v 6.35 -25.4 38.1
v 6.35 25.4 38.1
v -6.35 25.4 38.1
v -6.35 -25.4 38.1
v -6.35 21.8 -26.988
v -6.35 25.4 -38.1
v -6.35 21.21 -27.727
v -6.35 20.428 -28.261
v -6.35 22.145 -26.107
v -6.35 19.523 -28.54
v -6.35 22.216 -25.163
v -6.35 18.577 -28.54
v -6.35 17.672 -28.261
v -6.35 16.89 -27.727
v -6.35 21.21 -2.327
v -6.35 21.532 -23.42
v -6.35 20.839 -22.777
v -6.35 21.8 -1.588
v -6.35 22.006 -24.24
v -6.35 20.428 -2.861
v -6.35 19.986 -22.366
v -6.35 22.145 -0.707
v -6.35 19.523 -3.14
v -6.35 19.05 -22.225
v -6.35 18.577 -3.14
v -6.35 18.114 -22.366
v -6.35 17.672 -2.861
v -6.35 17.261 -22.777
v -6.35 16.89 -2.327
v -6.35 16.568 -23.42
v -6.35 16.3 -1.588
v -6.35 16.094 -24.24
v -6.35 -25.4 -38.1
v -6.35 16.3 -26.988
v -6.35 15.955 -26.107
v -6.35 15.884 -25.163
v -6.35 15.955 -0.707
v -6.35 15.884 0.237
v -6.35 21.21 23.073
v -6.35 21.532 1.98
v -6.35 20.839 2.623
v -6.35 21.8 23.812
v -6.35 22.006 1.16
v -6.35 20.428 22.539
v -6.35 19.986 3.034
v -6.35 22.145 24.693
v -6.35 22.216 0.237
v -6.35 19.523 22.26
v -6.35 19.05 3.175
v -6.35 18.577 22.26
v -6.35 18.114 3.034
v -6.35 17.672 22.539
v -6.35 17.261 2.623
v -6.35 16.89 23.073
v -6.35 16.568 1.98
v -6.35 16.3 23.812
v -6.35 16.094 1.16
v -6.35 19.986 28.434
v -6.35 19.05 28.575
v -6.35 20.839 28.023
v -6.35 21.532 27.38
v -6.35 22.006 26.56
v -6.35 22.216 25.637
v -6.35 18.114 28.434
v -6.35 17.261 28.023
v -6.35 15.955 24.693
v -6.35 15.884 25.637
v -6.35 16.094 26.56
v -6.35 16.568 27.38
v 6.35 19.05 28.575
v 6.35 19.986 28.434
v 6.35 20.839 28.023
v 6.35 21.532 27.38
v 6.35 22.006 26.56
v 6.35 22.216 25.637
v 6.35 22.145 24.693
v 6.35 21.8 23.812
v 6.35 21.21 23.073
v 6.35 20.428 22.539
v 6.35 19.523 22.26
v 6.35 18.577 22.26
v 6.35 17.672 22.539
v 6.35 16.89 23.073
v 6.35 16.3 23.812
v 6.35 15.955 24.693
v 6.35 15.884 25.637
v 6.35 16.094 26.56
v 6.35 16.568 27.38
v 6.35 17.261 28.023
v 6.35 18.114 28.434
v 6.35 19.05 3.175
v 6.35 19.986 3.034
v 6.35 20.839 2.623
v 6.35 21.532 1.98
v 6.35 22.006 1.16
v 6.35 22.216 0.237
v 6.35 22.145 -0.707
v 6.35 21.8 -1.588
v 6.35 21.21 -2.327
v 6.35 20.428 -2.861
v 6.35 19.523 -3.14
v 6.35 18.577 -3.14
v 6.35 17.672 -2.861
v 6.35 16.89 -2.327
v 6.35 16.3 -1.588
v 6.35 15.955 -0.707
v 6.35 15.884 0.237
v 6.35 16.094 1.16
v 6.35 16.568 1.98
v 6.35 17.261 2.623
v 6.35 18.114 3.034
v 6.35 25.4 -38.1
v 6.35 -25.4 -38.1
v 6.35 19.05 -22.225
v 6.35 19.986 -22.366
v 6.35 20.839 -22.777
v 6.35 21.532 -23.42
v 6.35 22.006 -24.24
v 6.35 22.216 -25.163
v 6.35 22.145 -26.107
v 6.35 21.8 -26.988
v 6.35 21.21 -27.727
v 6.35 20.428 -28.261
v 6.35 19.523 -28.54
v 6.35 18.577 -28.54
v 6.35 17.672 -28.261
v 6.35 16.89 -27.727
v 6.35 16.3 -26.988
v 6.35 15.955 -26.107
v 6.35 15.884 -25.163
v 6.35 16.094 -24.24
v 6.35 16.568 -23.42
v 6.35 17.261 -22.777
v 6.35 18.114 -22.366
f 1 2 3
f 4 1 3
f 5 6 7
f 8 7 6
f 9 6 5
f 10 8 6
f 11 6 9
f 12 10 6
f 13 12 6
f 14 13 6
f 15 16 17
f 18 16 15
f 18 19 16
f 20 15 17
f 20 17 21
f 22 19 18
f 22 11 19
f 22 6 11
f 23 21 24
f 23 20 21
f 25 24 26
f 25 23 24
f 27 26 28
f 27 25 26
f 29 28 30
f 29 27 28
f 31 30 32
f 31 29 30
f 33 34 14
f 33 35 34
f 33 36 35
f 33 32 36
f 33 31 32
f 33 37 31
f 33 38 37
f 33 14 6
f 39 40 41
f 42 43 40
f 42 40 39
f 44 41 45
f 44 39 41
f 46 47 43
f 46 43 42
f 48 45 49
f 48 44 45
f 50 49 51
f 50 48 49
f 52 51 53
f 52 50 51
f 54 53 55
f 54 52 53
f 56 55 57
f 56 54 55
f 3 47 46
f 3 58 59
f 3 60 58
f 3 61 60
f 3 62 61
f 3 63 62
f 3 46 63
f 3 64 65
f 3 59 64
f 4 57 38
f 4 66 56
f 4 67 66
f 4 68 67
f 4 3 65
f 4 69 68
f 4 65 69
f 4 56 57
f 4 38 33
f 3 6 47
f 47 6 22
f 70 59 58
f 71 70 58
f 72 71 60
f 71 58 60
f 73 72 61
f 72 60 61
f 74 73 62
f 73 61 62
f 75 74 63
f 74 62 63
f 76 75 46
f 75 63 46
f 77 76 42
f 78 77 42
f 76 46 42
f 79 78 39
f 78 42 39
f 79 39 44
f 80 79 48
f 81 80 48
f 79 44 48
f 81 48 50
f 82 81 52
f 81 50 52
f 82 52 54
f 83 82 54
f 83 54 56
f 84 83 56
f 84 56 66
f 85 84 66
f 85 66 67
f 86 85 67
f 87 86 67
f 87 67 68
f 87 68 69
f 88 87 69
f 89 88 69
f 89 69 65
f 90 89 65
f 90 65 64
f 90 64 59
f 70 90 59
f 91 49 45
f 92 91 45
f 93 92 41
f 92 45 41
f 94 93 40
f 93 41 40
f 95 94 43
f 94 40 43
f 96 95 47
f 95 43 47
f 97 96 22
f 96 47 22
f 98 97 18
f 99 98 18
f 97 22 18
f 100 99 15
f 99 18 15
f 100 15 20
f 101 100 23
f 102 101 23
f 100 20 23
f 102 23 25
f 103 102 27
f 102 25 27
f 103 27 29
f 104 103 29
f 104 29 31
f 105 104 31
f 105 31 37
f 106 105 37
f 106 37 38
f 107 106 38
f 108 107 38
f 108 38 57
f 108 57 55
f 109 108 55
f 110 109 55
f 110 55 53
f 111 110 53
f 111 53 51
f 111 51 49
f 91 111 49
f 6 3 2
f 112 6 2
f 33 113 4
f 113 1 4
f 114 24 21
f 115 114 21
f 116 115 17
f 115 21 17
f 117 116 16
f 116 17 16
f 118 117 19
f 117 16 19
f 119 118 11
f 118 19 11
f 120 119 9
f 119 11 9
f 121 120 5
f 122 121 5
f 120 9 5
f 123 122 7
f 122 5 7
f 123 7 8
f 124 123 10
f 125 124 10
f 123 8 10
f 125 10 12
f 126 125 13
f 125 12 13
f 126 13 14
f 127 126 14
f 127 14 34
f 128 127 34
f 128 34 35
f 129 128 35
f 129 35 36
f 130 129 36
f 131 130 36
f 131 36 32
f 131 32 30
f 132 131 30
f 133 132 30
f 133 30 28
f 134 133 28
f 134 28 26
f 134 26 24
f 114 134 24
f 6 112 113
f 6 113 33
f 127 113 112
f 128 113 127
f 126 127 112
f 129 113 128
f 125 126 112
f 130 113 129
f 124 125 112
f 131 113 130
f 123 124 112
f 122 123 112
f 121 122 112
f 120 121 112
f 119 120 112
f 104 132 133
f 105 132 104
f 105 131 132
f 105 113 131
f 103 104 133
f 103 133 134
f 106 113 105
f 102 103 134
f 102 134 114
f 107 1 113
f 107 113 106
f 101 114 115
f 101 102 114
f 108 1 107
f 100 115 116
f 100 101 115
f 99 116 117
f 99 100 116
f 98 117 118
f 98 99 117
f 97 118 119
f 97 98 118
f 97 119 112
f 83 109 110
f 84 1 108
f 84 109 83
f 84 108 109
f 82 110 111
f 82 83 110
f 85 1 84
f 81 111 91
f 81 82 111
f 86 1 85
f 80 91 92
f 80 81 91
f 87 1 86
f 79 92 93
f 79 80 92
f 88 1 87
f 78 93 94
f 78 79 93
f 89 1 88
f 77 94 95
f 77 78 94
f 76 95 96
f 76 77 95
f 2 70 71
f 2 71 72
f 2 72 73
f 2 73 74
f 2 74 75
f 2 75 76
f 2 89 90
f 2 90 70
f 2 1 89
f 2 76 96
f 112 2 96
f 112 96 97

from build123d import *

# Parameters (mm, degrees)
BOSS_EXTRUDE1_DEPTH      = 38.1
F_1_4_20_THREADED_HOLE_D = 6.35


with BuildPart() as part:
    # Sketch2 → Boss-Extrude1 (new, symmetric)
    with BuildSketch(Plane.XY):
        Polygon((-6.35, 25.4), (6.35, 25.4), (6.35, -12.7), (6.35, -25.4), (-6.35, -25.4), (-6.35, 12.7), align=None)
    extrude(amount=BOSS_EXTRUDE1_DEPTH, both=True)

    # 1/4"-20 threaded hole (through all)
    with Locations(Plane(origin=(6.35, 0, 0), x_dir=(0, 0, -1), z_dir=(1, 0, 0))):
        with Locations((-25.4, 19.05), (0, 19.05), (25.4, 19.05)):
            Hole(F_1_4_20_THREADED_HOLE_D / 2)


solid = part.part
